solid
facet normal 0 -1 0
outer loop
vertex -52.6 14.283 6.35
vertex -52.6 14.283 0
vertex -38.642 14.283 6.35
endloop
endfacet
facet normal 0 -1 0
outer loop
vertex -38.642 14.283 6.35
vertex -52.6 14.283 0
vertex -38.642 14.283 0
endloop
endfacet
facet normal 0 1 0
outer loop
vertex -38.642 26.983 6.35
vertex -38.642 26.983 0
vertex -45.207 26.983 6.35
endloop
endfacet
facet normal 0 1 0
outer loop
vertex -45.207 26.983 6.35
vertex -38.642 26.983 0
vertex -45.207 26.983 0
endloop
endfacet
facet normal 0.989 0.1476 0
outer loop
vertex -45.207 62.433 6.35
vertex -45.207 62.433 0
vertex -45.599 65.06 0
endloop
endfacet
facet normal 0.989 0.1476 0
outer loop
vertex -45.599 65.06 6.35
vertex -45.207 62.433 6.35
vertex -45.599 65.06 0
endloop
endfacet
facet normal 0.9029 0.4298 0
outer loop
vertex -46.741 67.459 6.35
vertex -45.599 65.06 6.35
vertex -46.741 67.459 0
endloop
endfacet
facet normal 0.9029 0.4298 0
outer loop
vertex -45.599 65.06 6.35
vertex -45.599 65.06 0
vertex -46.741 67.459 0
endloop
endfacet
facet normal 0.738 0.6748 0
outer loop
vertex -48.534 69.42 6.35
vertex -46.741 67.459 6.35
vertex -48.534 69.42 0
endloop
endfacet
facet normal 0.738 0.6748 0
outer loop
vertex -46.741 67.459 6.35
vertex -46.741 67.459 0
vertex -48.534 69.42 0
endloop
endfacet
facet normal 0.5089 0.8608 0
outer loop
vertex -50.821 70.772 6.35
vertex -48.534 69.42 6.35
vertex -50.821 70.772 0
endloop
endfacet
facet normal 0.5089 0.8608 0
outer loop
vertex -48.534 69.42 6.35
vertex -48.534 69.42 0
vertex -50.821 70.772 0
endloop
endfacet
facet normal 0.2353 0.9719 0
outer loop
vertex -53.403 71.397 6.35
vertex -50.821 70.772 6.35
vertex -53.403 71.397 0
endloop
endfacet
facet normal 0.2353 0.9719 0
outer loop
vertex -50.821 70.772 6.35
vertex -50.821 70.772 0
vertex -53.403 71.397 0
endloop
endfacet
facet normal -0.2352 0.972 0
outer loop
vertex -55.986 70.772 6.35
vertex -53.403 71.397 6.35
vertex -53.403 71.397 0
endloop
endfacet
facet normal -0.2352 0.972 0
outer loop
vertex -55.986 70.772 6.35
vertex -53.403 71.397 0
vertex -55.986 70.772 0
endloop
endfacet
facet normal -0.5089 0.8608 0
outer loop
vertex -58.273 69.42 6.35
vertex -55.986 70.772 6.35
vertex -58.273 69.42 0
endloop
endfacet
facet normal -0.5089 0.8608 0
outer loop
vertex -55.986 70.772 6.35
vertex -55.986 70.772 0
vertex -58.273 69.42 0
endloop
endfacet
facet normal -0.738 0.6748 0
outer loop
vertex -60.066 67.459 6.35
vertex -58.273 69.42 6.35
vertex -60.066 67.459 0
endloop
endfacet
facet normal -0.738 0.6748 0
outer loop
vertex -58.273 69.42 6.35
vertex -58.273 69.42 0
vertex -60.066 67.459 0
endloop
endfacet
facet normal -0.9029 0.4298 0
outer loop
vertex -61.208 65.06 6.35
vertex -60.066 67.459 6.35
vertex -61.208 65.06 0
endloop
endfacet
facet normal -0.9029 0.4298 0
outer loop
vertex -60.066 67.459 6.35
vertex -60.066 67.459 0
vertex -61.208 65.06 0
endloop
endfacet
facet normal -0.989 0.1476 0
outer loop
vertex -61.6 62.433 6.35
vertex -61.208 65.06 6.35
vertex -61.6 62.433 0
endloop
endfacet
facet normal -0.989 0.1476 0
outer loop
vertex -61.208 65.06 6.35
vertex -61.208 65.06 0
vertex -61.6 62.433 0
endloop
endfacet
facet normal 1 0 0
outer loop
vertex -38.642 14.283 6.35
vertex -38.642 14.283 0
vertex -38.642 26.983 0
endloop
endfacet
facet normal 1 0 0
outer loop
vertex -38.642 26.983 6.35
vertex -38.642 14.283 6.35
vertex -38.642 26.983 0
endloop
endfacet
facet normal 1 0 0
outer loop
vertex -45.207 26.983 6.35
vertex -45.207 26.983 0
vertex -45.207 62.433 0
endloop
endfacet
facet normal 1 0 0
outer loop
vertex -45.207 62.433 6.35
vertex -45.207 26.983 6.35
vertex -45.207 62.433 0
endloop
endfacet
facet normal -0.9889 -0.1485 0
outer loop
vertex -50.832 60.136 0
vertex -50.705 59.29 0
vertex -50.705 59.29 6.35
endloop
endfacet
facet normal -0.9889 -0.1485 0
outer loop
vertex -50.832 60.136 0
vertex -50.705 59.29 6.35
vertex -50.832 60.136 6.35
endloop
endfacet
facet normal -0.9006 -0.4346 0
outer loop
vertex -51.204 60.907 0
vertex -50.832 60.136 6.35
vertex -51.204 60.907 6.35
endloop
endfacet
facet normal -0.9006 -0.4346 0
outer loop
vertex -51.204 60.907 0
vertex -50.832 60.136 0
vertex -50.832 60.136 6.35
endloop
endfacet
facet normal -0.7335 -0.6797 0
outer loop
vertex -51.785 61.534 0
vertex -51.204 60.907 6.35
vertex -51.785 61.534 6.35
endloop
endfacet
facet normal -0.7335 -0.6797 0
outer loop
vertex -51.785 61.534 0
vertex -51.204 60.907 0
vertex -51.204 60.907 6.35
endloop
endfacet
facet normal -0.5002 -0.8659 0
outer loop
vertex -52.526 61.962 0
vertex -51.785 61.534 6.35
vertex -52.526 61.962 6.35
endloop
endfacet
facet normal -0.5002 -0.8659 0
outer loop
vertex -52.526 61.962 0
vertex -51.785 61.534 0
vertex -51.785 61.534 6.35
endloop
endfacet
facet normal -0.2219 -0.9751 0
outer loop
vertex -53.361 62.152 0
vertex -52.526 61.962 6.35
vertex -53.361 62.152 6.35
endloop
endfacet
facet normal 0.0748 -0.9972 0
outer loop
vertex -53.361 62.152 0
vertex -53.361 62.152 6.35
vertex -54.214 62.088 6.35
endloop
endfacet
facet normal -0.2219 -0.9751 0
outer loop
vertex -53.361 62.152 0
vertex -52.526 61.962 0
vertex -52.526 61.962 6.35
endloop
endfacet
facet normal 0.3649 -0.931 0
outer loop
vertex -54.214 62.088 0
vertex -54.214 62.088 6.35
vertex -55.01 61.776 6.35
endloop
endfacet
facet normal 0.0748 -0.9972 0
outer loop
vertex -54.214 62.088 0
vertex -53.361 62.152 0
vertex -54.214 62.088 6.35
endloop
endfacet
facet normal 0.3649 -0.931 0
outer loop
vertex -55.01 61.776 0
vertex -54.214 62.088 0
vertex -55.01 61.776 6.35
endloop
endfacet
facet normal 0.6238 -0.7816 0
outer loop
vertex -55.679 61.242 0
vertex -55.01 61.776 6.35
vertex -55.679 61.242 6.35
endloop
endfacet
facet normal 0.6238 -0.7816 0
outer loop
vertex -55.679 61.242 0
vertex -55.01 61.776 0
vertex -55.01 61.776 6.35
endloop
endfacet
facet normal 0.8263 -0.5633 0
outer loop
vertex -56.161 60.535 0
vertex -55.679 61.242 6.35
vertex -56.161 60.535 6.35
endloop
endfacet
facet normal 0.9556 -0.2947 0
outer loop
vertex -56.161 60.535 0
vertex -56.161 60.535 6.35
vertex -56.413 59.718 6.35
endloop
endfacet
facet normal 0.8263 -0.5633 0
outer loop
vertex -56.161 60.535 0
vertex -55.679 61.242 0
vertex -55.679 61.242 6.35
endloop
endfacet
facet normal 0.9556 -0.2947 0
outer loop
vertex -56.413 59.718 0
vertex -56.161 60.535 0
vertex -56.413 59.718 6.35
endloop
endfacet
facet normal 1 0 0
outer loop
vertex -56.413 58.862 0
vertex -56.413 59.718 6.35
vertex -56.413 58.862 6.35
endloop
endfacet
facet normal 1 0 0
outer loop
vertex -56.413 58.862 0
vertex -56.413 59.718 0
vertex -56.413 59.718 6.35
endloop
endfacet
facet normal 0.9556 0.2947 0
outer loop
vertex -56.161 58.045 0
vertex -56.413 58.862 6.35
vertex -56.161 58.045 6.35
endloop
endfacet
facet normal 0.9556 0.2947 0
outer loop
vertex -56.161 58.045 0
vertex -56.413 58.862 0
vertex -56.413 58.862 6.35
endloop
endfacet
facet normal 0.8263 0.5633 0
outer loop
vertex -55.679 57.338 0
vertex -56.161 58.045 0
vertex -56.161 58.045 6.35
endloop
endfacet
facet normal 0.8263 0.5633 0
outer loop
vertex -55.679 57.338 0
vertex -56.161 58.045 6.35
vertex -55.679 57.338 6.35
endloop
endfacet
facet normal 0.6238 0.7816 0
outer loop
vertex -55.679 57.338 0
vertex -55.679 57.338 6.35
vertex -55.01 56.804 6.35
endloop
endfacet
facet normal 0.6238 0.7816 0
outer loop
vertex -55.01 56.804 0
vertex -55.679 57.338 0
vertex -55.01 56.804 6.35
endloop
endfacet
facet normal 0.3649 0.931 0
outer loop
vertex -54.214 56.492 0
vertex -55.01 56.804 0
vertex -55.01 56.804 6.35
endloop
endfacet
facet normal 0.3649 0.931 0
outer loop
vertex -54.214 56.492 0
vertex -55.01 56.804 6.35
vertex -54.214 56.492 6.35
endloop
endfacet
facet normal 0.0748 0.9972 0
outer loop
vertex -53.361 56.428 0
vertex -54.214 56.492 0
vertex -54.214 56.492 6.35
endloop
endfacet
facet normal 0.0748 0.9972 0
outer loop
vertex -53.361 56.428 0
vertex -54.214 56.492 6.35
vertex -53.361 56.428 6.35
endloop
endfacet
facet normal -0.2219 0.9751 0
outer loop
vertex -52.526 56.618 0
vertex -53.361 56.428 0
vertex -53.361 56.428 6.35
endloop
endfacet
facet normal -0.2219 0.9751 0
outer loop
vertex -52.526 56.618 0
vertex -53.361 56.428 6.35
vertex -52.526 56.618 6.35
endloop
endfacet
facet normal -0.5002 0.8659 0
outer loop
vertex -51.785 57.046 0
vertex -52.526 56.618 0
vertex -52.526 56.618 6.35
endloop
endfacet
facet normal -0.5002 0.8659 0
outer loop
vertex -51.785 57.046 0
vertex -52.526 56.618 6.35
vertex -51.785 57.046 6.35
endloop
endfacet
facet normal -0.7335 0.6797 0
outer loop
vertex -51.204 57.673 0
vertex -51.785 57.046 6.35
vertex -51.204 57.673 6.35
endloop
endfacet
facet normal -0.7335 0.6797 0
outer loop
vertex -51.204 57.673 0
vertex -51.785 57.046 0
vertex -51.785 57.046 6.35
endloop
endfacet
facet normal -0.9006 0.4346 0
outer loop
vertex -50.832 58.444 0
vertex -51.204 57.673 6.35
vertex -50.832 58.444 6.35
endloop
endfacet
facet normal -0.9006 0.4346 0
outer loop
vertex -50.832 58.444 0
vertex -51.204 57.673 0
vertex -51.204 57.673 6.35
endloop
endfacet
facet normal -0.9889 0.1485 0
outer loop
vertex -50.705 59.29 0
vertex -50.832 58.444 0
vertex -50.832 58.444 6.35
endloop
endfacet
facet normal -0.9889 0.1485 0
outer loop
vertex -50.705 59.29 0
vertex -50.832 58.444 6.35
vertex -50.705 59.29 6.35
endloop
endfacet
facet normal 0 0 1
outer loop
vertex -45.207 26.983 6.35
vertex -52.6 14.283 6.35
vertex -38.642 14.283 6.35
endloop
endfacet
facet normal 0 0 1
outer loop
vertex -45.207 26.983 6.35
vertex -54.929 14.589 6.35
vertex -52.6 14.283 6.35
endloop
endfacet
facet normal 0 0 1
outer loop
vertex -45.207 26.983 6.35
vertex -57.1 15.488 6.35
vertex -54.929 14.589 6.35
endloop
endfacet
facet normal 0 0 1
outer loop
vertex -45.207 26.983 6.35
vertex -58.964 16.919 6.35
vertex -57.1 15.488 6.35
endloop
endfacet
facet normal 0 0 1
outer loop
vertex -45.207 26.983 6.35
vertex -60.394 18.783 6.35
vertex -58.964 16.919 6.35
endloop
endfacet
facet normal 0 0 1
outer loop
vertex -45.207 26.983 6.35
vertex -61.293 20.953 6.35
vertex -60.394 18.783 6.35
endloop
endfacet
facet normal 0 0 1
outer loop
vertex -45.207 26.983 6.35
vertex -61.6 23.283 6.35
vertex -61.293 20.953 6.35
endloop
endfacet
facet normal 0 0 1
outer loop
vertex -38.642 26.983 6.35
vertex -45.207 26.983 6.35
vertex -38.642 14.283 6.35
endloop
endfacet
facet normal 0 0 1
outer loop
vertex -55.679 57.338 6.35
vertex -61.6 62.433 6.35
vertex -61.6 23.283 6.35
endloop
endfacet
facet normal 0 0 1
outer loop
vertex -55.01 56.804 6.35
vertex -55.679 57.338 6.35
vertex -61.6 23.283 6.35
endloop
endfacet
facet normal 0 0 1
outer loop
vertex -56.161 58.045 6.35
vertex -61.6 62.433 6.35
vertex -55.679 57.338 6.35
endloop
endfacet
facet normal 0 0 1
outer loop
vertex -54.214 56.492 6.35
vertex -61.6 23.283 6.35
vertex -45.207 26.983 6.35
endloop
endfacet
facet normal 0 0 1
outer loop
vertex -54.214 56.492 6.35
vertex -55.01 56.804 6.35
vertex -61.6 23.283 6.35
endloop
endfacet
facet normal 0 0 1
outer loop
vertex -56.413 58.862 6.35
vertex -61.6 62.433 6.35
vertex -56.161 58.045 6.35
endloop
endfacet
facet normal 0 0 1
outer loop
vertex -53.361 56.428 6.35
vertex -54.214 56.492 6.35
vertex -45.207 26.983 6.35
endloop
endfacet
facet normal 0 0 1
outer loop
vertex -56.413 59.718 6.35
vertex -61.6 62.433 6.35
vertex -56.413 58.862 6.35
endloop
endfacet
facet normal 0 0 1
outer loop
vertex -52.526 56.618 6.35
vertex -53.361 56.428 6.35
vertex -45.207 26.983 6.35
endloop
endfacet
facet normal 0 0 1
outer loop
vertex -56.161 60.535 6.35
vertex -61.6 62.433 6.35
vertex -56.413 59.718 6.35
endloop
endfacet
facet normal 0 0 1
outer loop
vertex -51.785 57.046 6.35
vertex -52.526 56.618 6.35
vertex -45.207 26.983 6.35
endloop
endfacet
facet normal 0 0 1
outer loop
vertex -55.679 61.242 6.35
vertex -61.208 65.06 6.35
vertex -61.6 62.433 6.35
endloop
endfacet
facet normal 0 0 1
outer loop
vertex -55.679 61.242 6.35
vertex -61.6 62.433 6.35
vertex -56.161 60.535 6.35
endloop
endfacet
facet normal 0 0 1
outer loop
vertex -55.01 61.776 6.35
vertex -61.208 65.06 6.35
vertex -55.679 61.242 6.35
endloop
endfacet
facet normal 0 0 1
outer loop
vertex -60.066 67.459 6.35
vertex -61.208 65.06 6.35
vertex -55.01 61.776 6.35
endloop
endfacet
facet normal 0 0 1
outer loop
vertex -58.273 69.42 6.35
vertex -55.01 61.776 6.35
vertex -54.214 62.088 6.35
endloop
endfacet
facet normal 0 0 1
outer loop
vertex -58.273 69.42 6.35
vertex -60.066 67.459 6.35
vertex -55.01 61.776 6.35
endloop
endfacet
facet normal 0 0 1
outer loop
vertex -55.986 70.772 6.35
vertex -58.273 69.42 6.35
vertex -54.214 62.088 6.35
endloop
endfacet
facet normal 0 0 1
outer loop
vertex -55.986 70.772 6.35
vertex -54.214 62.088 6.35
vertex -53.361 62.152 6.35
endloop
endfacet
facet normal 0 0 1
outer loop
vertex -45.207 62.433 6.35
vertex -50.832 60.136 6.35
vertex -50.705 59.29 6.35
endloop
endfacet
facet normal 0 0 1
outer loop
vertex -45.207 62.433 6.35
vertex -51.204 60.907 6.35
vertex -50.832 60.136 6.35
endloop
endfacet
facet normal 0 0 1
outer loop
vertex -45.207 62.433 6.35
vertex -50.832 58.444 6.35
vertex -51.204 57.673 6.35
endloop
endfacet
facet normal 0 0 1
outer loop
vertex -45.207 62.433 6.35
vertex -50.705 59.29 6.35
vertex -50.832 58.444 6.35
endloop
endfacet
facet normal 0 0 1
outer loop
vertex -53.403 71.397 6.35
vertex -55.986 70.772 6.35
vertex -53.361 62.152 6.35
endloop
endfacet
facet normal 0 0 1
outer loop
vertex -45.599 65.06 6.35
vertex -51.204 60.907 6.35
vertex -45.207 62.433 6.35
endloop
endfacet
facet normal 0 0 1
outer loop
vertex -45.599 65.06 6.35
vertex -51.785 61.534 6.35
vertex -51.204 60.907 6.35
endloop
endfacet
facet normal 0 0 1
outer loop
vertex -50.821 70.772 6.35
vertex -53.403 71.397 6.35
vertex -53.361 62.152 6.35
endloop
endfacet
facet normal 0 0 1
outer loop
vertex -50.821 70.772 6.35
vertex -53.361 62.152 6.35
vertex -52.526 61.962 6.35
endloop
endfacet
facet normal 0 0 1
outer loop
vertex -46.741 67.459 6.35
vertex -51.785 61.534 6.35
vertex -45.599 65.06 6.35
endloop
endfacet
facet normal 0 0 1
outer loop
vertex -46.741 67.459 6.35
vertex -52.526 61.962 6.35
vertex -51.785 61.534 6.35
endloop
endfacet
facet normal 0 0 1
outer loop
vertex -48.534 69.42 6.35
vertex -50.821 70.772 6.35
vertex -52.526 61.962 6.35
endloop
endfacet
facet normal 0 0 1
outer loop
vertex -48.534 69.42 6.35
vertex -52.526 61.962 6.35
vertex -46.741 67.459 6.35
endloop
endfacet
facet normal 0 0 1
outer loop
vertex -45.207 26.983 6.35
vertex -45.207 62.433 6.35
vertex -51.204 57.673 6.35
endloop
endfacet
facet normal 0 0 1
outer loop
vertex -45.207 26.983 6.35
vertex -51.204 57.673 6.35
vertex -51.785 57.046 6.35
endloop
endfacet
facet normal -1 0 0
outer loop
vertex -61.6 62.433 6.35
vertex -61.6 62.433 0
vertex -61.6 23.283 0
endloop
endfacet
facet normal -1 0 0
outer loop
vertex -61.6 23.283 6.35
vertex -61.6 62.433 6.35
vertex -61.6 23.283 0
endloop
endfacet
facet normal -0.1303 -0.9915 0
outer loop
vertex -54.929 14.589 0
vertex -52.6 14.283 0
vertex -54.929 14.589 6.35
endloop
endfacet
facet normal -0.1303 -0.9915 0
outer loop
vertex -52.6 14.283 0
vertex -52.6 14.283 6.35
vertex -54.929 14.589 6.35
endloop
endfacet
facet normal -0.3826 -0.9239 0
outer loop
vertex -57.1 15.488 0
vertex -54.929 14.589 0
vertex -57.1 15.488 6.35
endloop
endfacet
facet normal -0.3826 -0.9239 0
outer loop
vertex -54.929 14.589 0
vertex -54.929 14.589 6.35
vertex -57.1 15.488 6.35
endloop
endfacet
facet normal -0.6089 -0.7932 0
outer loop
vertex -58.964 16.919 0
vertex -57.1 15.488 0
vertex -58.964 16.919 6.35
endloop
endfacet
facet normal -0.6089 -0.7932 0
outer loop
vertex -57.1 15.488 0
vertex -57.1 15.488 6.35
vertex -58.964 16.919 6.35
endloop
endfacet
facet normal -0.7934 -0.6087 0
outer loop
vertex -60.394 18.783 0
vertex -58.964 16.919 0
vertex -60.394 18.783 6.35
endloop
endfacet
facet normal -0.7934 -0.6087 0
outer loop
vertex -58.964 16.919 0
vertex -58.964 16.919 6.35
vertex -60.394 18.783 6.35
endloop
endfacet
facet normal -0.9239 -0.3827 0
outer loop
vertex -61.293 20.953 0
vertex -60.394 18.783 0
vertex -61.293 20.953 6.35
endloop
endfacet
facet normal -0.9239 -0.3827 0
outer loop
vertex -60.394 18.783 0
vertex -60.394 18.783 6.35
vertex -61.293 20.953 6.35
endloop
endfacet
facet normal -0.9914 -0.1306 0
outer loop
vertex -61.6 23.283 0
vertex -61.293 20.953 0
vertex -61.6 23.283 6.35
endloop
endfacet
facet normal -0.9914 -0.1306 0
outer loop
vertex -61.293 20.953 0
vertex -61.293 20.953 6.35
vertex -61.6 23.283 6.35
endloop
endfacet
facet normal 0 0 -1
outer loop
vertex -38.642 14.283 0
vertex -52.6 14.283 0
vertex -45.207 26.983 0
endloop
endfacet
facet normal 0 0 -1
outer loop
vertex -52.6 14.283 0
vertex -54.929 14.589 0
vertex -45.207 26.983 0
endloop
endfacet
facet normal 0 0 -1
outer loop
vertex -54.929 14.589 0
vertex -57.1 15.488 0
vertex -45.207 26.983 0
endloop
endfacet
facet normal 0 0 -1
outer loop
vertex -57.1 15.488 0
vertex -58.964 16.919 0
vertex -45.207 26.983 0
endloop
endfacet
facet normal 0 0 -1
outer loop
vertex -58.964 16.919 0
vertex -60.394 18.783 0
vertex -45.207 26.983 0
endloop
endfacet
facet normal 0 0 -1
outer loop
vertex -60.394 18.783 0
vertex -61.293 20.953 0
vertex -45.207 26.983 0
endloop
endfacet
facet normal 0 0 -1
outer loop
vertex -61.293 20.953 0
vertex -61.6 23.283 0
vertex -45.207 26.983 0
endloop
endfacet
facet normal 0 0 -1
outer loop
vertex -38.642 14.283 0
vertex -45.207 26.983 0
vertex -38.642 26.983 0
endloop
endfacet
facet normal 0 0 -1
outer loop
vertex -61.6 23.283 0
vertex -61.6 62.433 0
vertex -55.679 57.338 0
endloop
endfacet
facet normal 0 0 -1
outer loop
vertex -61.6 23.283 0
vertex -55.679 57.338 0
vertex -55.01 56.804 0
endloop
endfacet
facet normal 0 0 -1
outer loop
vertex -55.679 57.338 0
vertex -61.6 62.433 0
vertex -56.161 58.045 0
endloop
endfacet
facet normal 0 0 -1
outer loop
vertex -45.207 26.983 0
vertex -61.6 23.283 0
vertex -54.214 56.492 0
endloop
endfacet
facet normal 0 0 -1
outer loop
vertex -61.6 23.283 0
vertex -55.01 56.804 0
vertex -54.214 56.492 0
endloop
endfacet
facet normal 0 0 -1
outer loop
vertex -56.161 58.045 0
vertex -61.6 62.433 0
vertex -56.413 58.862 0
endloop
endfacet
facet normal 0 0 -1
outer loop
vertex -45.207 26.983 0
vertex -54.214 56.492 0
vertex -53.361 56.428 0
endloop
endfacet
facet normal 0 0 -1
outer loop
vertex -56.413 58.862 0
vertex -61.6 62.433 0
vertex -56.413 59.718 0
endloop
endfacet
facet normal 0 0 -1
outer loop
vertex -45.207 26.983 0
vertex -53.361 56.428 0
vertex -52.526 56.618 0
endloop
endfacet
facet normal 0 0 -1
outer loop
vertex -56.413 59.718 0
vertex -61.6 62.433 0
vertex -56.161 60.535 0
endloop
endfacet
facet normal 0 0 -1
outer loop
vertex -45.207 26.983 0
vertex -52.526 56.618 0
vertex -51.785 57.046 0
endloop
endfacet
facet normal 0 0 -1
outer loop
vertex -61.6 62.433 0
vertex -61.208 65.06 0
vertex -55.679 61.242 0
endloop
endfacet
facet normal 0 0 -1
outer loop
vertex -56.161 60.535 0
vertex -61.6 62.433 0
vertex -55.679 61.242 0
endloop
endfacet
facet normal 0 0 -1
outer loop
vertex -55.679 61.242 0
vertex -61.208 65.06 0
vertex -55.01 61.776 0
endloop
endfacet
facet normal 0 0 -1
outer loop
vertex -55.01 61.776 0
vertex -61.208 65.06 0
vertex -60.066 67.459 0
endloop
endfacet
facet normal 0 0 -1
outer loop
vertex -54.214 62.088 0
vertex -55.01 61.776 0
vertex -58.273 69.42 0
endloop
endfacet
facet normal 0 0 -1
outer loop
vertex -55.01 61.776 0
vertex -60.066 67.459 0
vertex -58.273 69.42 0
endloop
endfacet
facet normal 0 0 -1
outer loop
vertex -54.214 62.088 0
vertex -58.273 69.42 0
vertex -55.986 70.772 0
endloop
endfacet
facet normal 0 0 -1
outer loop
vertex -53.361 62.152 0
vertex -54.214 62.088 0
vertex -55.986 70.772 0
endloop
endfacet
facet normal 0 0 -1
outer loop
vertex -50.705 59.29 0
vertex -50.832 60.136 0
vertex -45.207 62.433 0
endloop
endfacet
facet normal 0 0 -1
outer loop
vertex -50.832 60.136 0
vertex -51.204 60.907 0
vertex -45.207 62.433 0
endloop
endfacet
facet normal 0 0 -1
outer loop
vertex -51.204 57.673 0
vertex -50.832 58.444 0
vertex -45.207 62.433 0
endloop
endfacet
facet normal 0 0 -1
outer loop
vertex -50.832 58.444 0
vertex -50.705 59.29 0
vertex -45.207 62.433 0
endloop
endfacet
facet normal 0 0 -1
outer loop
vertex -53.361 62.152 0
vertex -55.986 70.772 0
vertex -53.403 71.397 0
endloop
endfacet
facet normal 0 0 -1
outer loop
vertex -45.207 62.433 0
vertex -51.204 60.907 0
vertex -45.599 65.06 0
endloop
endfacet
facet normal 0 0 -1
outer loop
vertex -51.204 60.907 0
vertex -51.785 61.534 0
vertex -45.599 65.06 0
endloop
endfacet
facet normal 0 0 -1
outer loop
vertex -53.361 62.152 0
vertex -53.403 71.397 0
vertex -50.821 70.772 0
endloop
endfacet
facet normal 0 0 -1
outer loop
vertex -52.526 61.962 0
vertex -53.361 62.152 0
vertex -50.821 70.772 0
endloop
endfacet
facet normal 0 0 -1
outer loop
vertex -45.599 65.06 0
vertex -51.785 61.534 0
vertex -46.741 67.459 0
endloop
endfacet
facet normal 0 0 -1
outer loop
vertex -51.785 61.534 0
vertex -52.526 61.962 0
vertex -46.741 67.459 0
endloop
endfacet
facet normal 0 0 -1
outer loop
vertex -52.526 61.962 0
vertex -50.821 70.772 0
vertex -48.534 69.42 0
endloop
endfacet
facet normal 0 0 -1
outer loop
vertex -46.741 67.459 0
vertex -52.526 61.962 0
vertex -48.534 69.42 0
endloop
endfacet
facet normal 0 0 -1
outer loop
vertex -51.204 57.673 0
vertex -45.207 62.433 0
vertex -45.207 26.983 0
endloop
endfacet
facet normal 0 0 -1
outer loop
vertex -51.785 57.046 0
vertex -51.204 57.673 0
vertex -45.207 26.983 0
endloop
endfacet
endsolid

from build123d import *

# Parameters (mm, degrees)
SKETCH1_R           = 2.8702
BOSS_EXTRUDE1_DEPTH = 6.35
FILLET1_R           = 9
FILLET2_R           = 9


with BuildPart() as part:
    # Sketch1 → Boss-Extrude1 (new body)
    with BuildSketch(Plane.XY):
        Polygon((-38.642090152, 26.982634823), (-45.206950064, 26.982634823), (-45.206950064, 71.432634823), (-61.6, 71.432634823), (-61.6, 14.282634823), (-45.206950064, 14.282634823), (-38.642090152, 14.282634823), align=None)
        with Locations((-53.575, 59.289941788)):
            Circle(SKETCH1_R, mode=Mode.SUBTRACT)
    extrude(amount=BOSS_EXTRUDE1_DEPTH)

    # Fillet1
    # the kernel refuses this fillet: 9 mm, written as the material it takes off along each edge
    with BuildSketch(Plane(origin=(-45.206950064, 71.432634823, -22.5), x_dir=(-1, 0, 0), z_dir=(0, 0, 1)), Plane(origin=(-61.6, 71.432634823, -22.5), x_dir=(0, -1, 0), z_dir=(0, 0, 1))) as fillet1_piece_1:
        with BuildLine():
            CenterArc((FILLET1_R, FILLET1_R), FILLET1_R, 180, 90)
            Line((0, FILLET1_R), (0, 0))
            Line((0, 0), (FILLET1_R, 0))
        make_face()
    extrude(amount=51.35, mode=Mode.SUBTRACT)

    # Fillet2
    fillet2_edges = [part.edges().sort_by_distance(p)[0] for p in [
        (-61.6, 14.282634823, 3.175),
    ]]
    fillet(fillet2_edges, radius=FILLET2_R)


solid = part.part
